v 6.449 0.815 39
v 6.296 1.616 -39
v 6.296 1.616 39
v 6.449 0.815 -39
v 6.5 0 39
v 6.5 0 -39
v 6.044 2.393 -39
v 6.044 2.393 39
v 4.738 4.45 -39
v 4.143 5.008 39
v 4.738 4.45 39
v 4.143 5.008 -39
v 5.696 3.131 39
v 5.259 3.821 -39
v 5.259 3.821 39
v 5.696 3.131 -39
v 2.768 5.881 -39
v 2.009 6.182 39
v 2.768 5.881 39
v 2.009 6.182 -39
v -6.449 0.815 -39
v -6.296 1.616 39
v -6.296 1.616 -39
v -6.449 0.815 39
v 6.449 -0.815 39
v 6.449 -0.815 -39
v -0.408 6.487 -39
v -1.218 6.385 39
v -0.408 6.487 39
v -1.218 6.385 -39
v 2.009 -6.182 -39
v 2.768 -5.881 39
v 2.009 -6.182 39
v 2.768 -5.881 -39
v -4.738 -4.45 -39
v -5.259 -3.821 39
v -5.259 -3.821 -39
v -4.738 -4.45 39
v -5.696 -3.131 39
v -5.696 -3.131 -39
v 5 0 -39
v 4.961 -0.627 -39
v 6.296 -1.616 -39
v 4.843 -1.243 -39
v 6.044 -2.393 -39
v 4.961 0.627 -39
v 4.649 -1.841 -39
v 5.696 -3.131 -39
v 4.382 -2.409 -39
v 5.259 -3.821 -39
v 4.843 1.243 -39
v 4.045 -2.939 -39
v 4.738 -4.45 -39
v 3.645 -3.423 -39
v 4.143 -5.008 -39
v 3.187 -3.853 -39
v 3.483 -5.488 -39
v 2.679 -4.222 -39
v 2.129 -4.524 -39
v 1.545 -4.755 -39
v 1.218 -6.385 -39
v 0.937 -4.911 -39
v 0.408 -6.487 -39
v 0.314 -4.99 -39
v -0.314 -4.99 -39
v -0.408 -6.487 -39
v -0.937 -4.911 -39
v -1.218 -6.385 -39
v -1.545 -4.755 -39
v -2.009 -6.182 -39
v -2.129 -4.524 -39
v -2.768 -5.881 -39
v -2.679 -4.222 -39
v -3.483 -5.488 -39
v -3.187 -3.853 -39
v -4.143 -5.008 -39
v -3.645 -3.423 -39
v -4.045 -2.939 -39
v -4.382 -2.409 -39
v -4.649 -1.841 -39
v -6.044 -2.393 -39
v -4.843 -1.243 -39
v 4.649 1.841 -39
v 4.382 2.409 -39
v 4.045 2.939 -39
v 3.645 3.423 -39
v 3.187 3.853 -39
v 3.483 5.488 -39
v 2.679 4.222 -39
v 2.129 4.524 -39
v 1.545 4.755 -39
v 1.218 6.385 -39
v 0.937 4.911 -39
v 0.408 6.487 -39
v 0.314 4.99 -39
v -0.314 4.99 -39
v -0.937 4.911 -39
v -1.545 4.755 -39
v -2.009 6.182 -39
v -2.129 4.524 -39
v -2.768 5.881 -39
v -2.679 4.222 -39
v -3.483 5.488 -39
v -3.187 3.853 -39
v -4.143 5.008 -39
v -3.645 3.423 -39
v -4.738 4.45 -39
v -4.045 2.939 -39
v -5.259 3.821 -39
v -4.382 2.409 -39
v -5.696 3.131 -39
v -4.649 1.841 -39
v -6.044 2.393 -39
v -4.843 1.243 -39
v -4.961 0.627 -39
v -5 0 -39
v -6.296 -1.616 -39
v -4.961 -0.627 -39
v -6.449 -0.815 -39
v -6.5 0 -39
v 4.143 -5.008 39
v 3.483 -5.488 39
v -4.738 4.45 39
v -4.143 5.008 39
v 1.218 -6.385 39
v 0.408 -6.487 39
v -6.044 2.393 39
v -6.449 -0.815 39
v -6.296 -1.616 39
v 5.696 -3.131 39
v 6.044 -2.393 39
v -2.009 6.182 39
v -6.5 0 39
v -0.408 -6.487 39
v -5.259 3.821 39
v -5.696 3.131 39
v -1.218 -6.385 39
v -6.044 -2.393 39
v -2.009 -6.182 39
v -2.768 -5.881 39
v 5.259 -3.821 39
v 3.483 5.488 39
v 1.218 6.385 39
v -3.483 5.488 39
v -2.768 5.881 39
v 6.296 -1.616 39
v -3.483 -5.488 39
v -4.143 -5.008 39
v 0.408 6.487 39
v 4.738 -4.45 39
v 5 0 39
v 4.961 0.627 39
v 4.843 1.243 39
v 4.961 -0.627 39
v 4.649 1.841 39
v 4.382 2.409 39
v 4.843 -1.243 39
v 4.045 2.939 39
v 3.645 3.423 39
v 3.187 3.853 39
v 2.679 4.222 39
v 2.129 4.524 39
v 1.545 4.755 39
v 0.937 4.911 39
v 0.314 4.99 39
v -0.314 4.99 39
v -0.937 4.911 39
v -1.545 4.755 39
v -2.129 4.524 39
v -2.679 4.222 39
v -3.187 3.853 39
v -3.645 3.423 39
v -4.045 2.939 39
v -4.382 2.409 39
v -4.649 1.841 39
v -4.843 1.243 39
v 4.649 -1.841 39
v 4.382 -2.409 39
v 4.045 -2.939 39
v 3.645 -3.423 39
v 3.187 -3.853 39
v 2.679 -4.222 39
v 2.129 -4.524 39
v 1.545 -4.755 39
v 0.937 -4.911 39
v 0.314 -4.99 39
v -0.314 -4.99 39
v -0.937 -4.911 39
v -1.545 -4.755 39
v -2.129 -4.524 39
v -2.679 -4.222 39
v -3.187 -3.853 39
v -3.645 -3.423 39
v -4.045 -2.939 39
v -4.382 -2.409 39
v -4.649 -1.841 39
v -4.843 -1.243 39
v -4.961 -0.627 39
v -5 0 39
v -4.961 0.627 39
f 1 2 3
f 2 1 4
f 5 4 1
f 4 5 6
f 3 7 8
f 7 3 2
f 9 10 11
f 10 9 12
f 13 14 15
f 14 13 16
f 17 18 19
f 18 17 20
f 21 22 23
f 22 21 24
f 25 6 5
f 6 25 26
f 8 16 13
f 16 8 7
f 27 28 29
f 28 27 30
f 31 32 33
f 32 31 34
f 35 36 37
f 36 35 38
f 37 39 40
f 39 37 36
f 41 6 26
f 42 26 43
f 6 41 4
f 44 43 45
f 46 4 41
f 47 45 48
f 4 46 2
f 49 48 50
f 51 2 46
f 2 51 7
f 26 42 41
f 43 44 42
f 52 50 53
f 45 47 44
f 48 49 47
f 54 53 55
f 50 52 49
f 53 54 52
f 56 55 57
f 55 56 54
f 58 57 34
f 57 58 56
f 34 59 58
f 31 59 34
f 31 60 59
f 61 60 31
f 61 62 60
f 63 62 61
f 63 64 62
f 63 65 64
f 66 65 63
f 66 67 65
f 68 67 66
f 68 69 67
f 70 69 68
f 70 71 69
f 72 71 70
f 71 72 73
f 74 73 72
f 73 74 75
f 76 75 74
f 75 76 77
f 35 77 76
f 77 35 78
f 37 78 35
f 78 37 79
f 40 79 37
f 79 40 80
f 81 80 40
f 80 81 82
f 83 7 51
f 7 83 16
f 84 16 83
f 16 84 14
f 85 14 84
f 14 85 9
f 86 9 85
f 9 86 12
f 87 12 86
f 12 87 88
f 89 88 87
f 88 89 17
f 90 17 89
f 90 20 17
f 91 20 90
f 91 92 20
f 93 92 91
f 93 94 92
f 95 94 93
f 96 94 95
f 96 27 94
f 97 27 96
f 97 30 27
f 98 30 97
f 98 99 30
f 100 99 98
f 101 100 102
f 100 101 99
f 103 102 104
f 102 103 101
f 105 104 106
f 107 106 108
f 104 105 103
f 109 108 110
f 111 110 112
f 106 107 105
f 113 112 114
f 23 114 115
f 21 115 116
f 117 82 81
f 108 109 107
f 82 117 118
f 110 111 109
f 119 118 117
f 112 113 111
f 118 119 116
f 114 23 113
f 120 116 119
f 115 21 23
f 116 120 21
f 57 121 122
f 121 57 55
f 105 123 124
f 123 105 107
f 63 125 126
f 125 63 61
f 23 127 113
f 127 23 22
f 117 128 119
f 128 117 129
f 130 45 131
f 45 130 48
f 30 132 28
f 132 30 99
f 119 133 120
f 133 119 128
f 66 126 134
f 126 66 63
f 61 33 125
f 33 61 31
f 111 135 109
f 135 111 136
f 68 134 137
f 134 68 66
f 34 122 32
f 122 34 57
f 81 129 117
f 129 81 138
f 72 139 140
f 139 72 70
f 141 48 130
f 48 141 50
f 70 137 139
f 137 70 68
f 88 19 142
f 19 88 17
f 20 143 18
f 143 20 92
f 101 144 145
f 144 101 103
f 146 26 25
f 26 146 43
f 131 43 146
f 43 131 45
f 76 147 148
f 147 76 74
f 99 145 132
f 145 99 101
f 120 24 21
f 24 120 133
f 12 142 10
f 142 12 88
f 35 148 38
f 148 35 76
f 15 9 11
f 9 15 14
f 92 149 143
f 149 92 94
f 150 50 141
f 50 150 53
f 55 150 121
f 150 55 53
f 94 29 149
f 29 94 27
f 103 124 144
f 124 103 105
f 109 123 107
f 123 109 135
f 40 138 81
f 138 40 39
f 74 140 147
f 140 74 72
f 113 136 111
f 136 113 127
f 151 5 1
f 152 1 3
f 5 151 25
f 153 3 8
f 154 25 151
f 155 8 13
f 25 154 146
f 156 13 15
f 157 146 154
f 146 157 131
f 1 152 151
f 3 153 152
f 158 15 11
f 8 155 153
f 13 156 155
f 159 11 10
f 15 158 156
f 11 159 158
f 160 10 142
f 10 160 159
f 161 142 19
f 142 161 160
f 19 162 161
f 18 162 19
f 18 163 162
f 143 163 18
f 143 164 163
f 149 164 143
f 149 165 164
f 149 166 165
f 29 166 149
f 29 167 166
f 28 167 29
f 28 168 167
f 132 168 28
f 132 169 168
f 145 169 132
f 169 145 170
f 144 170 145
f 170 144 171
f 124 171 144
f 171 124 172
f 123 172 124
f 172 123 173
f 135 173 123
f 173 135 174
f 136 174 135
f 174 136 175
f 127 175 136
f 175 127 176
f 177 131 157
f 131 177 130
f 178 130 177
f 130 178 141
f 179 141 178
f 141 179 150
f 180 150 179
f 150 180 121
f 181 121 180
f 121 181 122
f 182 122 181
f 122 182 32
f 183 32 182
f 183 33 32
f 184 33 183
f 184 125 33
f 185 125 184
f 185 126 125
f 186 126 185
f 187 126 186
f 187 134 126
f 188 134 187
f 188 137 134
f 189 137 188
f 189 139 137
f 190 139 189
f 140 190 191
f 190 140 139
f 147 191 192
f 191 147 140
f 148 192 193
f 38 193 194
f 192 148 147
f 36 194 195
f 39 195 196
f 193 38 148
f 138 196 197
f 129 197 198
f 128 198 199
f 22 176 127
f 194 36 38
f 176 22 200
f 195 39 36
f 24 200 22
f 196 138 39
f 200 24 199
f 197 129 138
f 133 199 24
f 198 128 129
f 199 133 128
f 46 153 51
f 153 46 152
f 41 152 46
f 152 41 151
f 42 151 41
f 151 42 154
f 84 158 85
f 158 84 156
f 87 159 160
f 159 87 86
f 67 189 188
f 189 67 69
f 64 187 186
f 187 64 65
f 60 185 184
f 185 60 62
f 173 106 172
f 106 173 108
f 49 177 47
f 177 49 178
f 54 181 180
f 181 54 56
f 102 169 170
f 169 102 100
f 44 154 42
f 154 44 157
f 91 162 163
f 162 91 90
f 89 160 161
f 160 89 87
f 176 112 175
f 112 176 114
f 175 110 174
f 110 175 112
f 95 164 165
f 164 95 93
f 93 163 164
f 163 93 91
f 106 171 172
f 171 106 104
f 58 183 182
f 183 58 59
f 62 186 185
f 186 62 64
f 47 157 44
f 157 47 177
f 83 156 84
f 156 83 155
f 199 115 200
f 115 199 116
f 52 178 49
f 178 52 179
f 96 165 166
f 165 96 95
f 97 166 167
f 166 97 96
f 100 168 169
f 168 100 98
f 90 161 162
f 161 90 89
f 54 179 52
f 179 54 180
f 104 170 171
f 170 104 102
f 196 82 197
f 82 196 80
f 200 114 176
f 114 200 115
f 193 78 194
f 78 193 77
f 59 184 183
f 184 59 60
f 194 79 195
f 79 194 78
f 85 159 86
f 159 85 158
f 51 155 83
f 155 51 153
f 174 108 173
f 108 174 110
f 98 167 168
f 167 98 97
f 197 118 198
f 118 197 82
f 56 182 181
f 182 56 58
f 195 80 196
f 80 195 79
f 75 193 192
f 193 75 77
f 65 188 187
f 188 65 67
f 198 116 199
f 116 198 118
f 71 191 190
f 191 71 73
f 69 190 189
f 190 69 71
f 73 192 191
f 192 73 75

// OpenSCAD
$fn = 50;


difference() {
	union() {
		translate(v = [0, 0, -39.0000000000]) {
			cylinder(h = 78, r = 6.5000000000);
		}
	}
	union() {
		translate(v = [0, 0, -100.0000000000]) {
			cylinder(h = 200, r = 5.0000000000);
		}
	}
}
